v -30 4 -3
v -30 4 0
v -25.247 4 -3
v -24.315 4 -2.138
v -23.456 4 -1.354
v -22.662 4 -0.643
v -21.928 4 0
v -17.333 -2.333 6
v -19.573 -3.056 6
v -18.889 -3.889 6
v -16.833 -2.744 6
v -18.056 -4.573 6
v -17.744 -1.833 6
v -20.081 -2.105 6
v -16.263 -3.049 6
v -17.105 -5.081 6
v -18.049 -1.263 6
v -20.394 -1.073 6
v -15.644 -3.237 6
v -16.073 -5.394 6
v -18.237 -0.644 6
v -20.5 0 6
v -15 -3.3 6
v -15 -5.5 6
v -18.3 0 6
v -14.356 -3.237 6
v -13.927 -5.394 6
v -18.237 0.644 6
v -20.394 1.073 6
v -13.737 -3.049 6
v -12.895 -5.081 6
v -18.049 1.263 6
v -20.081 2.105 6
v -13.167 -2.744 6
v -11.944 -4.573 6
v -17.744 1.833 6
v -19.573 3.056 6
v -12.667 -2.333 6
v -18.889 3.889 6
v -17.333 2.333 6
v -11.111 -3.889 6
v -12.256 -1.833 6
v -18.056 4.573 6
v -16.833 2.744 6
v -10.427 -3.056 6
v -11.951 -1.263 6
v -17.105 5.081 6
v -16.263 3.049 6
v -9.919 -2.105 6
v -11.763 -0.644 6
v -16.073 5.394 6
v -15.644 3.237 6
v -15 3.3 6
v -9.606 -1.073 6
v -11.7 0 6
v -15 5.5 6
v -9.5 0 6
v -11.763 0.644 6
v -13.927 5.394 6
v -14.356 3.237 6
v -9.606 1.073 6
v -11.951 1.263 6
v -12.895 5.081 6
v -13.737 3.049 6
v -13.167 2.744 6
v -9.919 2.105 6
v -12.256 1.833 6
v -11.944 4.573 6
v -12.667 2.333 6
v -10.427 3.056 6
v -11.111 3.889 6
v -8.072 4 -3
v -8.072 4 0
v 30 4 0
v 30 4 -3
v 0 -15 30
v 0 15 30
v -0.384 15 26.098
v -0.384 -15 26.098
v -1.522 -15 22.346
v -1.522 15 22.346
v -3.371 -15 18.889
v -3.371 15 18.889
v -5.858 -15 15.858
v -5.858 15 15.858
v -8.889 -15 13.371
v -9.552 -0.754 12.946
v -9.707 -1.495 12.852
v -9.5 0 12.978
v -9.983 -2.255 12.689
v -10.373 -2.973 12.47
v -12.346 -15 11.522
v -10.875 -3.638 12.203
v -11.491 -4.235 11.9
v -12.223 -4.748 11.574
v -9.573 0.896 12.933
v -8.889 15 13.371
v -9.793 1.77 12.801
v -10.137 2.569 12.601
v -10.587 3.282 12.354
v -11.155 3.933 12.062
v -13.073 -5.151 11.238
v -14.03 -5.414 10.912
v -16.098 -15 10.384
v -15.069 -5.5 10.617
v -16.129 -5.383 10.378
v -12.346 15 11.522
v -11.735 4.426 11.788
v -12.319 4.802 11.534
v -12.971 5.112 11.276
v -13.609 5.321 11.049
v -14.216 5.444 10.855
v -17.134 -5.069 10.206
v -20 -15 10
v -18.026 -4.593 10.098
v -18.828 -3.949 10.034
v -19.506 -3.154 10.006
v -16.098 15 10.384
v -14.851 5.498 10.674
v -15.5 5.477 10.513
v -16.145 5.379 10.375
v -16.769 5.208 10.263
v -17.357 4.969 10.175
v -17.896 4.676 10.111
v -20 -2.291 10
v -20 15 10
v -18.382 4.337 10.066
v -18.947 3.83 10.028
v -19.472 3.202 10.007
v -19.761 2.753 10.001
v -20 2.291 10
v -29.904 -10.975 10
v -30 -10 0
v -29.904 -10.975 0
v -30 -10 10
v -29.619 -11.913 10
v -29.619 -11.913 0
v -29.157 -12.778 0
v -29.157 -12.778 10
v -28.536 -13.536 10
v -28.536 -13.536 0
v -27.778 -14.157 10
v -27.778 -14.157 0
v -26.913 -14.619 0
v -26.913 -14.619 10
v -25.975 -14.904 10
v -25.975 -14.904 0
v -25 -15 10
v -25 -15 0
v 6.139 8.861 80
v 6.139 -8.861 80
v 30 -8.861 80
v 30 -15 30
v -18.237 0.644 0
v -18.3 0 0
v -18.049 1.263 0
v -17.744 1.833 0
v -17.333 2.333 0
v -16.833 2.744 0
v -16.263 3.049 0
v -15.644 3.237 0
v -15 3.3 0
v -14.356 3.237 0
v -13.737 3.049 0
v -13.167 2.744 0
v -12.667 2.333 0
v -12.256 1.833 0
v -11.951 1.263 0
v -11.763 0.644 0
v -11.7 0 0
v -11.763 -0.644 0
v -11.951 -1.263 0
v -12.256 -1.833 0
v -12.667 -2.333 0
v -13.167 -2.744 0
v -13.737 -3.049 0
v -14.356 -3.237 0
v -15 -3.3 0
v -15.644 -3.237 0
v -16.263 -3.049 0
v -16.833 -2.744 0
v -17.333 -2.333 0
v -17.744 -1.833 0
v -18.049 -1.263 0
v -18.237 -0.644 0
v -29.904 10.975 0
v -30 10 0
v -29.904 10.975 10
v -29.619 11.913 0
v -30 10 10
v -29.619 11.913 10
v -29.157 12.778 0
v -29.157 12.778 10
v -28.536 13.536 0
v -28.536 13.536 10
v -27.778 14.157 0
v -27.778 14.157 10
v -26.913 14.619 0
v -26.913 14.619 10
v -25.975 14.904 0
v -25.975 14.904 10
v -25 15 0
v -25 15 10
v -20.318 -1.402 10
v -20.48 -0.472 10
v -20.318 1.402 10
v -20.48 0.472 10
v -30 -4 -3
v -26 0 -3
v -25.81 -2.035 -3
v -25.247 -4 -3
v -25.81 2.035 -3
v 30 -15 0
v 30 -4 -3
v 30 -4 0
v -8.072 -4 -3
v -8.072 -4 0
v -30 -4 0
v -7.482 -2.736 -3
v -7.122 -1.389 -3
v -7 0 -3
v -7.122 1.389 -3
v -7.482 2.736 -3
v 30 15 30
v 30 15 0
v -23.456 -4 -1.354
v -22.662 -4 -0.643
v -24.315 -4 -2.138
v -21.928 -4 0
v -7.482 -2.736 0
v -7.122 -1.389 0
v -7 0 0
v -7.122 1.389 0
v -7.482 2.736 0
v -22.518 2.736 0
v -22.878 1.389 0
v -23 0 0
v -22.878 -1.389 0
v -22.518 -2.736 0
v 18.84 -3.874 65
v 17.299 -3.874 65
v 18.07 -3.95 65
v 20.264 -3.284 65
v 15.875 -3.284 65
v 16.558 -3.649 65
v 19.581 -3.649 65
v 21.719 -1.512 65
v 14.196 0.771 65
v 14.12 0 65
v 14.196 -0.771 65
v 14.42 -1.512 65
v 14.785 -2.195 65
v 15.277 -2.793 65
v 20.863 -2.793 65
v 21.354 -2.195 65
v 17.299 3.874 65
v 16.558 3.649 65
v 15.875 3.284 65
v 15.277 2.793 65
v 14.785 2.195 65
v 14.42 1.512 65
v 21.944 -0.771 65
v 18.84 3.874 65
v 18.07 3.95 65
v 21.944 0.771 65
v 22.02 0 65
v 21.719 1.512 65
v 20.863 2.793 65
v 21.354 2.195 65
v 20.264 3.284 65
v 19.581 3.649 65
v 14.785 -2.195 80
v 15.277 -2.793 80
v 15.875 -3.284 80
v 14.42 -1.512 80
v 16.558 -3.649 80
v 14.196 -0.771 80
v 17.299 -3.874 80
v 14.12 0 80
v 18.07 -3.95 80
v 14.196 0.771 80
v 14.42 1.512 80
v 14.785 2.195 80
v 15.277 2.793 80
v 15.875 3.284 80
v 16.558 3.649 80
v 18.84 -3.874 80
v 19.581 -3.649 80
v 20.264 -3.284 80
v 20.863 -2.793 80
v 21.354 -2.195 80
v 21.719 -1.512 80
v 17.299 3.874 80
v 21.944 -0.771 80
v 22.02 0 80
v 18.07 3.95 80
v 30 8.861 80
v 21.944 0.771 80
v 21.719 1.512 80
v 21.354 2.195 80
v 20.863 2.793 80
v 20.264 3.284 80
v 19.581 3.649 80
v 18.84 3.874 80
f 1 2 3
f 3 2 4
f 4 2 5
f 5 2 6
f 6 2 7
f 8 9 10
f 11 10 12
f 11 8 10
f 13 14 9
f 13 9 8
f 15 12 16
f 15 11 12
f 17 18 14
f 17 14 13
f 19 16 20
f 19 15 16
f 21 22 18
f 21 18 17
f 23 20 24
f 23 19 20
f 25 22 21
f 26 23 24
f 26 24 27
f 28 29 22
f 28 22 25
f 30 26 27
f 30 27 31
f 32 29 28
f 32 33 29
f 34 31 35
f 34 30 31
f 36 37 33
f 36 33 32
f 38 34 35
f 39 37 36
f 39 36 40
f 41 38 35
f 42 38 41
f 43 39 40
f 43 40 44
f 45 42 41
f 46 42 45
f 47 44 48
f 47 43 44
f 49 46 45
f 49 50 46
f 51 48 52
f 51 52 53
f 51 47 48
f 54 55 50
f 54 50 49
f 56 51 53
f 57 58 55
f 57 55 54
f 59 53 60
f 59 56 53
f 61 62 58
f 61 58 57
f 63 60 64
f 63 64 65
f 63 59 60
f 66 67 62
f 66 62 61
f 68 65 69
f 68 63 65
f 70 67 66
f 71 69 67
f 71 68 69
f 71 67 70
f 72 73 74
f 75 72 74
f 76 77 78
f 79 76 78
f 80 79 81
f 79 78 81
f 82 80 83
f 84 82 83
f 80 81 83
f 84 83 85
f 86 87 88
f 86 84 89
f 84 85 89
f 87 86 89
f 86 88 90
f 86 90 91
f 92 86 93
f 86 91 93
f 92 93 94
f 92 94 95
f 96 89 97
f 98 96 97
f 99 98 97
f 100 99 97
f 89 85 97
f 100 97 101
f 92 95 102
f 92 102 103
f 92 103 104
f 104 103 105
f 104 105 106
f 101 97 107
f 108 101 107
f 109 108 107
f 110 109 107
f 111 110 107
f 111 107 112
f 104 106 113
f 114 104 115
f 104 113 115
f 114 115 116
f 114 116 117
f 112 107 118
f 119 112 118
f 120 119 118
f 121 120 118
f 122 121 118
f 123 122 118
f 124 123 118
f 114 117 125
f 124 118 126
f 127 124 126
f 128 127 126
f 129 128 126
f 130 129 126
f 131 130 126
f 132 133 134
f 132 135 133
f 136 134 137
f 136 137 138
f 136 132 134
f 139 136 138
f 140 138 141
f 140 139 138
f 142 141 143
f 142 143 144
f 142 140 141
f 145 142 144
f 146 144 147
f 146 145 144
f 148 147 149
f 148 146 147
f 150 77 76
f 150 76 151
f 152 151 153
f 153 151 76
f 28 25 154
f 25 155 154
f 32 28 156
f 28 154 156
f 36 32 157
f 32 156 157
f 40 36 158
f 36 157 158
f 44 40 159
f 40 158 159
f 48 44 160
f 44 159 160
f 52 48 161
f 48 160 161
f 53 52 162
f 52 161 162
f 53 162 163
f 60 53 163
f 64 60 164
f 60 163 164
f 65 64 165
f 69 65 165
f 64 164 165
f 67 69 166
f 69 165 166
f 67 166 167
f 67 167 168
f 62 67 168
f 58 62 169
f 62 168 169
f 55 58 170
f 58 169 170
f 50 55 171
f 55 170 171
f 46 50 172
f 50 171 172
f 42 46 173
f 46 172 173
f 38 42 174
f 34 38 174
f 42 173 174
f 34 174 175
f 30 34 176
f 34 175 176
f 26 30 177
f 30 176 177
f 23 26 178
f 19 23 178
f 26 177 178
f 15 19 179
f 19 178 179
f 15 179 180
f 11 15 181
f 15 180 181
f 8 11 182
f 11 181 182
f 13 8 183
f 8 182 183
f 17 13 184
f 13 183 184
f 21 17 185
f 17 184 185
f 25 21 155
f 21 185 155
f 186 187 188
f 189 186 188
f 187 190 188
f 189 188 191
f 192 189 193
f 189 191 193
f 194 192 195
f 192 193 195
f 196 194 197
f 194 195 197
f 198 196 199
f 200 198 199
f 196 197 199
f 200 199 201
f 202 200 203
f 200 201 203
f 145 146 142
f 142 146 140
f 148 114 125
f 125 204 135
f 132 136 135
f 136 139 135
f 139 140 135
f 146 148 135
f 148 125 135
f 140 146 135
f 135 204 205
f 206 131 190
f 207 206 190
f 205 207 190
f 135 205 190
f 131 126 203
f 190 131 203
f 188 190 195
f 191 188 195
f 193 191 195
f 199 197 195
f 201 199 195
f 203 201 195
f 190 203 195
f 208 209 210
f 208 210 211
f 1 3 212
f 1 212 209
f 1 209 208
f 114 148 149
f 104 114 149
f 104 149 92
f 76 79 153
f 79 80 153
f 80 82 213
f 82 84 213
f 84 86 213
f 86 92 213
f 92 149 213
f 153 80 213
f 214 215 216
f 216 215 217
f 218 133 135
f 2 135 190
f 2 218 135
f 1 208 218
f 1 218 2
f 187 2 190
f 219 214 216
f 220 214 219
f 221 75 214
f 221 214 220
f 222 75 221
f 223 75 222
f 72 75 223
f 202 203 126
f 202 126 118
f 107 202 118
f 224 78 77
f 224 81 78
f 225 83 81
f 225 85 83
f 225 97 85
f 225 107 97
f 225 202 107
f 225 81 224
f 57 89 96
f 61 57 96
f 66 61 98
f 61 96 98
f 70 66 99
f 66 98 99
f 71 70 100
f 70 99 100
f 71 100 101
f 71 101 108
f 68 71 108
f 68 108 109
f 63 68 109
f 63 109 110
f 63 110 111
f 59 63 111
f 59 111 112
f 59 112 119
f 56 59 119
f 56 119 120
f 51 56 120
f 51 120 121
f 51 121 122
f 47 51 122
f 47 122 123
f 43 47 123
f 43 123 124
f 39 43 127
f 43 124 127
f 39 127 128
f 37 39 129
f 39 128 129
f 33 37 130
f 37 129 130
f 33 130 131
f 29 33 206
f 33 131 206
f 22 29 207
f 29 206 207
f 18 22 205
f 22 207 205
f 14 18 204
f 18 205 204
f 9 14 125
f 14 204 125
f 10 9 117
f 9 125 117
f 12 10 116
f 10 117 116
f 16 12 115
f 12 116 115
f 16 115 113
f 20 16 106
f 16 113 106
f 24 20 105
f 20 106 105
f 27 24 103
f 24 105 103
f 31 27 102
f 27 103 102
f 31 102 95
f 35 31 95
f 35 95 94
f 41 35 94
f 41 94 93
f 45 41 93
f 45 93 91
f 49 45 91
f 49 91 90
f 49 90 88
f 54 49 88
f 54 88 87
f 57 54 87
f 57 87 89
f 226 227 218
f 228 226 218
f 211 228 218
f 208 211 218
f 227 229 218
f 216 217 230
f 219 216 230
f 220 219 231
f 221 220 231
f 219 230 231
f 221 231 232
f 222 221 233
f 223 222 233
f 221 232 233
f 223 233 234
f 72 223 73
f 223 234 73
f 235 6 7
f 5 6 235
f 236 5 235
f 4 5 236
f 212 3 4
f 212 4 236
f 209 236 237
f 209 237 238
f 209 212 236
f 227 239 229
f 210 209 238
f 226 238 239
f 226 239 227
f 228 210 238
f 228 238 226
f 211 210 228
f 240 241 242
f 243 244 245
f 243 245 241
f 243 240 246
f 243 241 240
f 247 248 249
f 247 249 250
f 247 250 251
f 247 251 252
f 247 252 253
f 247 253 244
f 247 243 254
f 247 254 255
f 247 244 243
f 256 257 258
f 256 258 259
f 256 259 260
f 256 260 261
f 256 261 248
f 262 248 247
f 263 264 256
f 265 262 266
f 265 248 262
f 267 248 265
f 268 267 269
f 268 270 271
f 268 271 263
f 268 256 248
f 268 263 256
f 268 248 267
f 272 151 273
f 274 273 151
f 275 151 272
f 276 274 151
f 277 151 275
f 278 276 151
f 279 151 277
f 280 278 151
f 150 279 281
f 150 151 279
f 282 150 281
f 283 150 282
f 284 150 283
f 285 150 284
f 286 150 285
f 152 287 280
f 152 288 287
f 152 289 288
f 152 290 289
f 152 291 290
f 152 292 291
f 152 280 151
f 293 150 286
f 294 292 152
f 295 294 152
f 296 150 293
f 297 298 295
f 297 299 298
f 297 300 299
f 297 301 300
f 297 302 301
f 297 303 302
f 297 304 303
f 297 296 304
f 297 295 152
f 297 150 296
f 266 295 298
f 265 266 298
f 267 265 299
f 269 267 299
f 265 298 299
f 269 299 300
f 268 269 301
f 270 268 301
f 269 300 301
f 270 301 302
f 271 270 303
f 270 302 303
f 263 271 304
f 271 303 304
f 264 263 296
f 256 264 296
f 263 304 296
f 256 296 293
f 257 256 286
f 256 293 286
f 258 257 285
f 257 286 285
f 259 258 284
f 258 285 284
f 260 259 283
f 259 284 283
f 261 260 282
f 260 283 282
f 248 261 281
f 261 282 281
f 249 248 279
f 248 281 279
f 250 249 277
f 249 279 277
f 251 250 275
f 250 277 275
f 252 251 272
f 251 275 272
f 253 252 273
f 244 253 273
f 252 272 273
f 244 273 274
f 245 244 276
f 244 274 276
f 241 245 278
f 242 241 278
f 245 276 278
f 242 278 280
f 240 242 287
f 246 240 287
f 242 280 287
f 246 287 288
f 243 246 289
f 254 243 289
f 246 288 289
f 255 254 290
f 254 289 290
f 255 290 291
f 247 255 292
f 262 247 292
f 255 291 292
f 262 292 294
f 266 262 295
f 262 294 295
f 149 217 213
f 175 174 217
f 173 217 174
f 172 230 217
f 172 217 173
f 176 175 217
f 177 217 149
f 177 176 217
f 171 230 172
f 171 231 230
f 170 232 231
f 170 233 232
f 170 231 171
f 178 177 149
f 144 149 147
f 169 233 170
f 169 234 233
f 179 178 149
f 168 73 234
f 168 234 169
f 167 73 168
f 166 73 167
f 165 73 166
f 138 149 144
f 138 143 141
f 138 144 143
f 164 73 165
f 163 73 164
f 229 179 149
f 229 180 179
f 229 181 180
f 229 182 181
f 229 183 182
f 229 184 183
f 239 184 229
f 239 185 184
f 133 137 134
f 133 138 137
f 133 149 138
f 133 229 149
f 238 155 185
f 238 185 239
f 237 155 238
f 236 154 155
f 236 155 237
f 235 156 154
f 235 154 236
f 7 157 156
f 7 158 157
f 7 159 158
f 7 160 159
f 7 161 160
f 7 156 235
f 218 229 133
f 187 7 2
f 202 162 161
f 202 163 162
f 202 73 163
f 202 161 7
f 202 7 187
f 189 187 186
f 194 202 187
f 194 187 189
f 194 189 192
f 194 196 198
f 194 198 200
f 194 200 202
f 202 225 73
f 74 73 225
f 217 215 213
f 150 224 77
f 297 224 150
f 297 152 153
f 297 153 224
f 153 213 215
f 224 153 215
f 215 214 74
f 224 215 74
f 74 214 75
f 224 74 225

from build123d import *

# Parameters (mm, degrees)
BASE_DEPTH                    = 10
TOWER_SKETCH_W                = 29.999999999999996
TOWER_SKETCH_H                = 30
TOWER_DEPTH                   = 70
BASE_RADIUS_R                 = 20
BASE_SCREW_D                  = 6.6
BASE_SCREW_CBORE_D            = 11
BASE_SCREW_CBORE_DEPTH        = 24
TOWER_BEVEL_SIZE              = 50
TOWER_BEVEL_SIZE_2            = 6.139228045
TOP_COVER_SCREW_HOLE_SKETCH_R = 3.950000000000002
COVER_SREW_HOLE_DEPTH         = 15
P_IDAT_VYSUNUT_M3_DEPTH       = 3
PROFILE_BEVEL_SIZE            = 3
ROUNDING_R                    = 5


# Some blends are built 0.0001 mm under size
with BuildPart() as part:
    # Base sketch → Base (new body)
    with BuildSketch(Plane.XY):
        Polygon((-30.000000000000007, 15.000000000000002), (29.999999999999986, 15.000000000000002), (29.999999999999993, -14.999999999999998), (-30, -14.999999999999998), align=None)
    extrude(amount=BASE_DEPTH)

    # Tower sketch → Tower (add)
    with BuildSketch(Plane.XY.offset(10)):
        with Locations((14.999999999999988, 1.78e-15)):
            Rectangle(TOWER_SKETCH_W, TOWER_SKETCH_H)
    extrude(amount=TOWER_DEPTH)

    # Base radius
    base_radius_edges = [part.edges().sort_by_distance(p)[0] for p in [
        (-1.041e-14, 1.78e-15, 10),
    ]]
    fillet(base_radius_edges, radius=BASE_RADIUS_R)

    # Base screw (through all)
    with Locations(Plane.XY.offset(30)):
        with Locations((-15, 0)):
            CounterBoreHole(BASE_SCREW_D / 2, BASE_SCREW_CBORE_D / 2, BASE_SCREW_CBORE_DEPTH)

    # tower bevel
    # the kernel refuses this chamfer: 50, 6.139228045 mm, written as the material it takes off along each edge
    with BuildSketch(Plane(origin=(159.96415924997035, 15.000000000000002, 80), x_dir=(0, 0.004688575069790863, -0.9999890085715016), z_dir=(-1, 0, 0))) as tower_bevel_piece_1:
        Polygon((TOWER_BEVEL_SIZE * 0.999989008572, TOWER_BEVEL_SIZE * 0.00468857506979), (-TOWER_BEVEL_SIZE_2 * 0.0046885750699, TOWER_BEVEL_SIZE_2 * 0.999989008595), (0, 0), align=None)
    extrude(amount=289.9283184999407, mode=Mode.SUBTRACT)
    with BuildSketch(Plane(origin=(-1.041e-14, 144.96415924997035, 80), x_dir=(-0.00468857506979085, 0, -0.9999890085715016), z_dir=(0, -1, 0))) as tower_bevel_piece_2:
        Polygon((TOWER_BEVEL_SIZE * 0.999989008572, TOWER_BEVEL_SIZE * 0.00468857506979), (-TOWER_BEVEL_SIZE_2 * 0.0046885750699, TOWER_BEVEL_SIZE_2 * 0.999989008595), (0, 0), align=None)
    extrude(amount=289.9283184999407, mode=Mode.SUBTRACT)
    with BuildSketch(Plane(origin=(-129.96415924997035, -14.999999999999998, 80), x_dir=(0, 0.9548873060039238, 0.2969684037613576), z_dir=(1, 0, 0))) as tower_bevel_piece_3:
        Polygon((TOWER_BEVEL_SIZE_2 * 0.954887306027, -TOWER_BEVEL_SIZE_2 * 0.296968403768), (-TOWER_BEVEL_SIZE * 0.296968403761, -TOWER_BEVEL_SIZE * 0.954887306004), (0, 0), align=None)
    extrude(amount=289.9283184999407, mode=Mode.SUBTRACT)

    # Top cover screw hole sketch → Cover srew hole (cut)
    with BuildSketch(Plane.XY.offset(80)):
        with Locations((18.06961402257261, 2.6e-15)):
            Circle(TOP_COVER_SCREW_HOLE_SKETCH_R)
    extrude(amount=-COVER_SREW_HOLE_DEPTH, mode=Mode.SUBTRACT)

    # profile sketch → Přidat vysunutím3 (add)
    with BuildSketch(Plane(origin=(0, 0, 0), x_dir=(-1, 0, 0), z_dir=(0, 0, -1))):
        with BuildLine():
            Line((8.071796769724529, 4), (-30, 4))
            Line((-30, 4), (-30, -4))
            Line((-30, -4), (8.071796769724536, -4))
            ThreePointArc((8.071796769724518, -4.000000000000045), (7.000000000000002, 9.8e-16), (8.071796769724518, 4.0000000000000435))
        make_face()
        with BuildLine():
            Line((30.000000000000007, 4), (21.928203230275386, 4))
            ThreePointArc((21.928203230275436, 4.0000000000001386), (22.72740661031253, 2.070552360820243), (23.000000000000007, 0))
            ThreePointArc((23.000000000000007, -1.96e-15), (22.72740661031253, -2.0705523608202414), (21.928203230275436, -4.000000000000134))
            Line((21.928203230275393, -4), (30.000000000000007, -4))
            Line((30.000000000000007, -4), (30.000000000000007, 4))
        make_face()
    extrude(amount=P_IDAT_VYSUNUT_M3_DEPTH)

    # Profile bevel
    profile_bevel_edges = [part.edges().sort_by_distance(p)[0] for p in [
        (-23.000000000000007, 3.22e-15, -3),
    ]]
    chamfer(profile_bevel_edges, length=PROFILE_BEVEL_SIZE - 0.0001)  # a hair under: the kernel refuses the full size

    # rounding
    rounding_edges = [part.edges().sort_by_distance(p)[0] for p in [
        (-30, -14.999999999999998, 5),
        (-30.000000000000007, 15.000000000000002, 5),
    ]]
    fillet(rounding_edges, radius=ROUNDING_R)


solid = part.part
